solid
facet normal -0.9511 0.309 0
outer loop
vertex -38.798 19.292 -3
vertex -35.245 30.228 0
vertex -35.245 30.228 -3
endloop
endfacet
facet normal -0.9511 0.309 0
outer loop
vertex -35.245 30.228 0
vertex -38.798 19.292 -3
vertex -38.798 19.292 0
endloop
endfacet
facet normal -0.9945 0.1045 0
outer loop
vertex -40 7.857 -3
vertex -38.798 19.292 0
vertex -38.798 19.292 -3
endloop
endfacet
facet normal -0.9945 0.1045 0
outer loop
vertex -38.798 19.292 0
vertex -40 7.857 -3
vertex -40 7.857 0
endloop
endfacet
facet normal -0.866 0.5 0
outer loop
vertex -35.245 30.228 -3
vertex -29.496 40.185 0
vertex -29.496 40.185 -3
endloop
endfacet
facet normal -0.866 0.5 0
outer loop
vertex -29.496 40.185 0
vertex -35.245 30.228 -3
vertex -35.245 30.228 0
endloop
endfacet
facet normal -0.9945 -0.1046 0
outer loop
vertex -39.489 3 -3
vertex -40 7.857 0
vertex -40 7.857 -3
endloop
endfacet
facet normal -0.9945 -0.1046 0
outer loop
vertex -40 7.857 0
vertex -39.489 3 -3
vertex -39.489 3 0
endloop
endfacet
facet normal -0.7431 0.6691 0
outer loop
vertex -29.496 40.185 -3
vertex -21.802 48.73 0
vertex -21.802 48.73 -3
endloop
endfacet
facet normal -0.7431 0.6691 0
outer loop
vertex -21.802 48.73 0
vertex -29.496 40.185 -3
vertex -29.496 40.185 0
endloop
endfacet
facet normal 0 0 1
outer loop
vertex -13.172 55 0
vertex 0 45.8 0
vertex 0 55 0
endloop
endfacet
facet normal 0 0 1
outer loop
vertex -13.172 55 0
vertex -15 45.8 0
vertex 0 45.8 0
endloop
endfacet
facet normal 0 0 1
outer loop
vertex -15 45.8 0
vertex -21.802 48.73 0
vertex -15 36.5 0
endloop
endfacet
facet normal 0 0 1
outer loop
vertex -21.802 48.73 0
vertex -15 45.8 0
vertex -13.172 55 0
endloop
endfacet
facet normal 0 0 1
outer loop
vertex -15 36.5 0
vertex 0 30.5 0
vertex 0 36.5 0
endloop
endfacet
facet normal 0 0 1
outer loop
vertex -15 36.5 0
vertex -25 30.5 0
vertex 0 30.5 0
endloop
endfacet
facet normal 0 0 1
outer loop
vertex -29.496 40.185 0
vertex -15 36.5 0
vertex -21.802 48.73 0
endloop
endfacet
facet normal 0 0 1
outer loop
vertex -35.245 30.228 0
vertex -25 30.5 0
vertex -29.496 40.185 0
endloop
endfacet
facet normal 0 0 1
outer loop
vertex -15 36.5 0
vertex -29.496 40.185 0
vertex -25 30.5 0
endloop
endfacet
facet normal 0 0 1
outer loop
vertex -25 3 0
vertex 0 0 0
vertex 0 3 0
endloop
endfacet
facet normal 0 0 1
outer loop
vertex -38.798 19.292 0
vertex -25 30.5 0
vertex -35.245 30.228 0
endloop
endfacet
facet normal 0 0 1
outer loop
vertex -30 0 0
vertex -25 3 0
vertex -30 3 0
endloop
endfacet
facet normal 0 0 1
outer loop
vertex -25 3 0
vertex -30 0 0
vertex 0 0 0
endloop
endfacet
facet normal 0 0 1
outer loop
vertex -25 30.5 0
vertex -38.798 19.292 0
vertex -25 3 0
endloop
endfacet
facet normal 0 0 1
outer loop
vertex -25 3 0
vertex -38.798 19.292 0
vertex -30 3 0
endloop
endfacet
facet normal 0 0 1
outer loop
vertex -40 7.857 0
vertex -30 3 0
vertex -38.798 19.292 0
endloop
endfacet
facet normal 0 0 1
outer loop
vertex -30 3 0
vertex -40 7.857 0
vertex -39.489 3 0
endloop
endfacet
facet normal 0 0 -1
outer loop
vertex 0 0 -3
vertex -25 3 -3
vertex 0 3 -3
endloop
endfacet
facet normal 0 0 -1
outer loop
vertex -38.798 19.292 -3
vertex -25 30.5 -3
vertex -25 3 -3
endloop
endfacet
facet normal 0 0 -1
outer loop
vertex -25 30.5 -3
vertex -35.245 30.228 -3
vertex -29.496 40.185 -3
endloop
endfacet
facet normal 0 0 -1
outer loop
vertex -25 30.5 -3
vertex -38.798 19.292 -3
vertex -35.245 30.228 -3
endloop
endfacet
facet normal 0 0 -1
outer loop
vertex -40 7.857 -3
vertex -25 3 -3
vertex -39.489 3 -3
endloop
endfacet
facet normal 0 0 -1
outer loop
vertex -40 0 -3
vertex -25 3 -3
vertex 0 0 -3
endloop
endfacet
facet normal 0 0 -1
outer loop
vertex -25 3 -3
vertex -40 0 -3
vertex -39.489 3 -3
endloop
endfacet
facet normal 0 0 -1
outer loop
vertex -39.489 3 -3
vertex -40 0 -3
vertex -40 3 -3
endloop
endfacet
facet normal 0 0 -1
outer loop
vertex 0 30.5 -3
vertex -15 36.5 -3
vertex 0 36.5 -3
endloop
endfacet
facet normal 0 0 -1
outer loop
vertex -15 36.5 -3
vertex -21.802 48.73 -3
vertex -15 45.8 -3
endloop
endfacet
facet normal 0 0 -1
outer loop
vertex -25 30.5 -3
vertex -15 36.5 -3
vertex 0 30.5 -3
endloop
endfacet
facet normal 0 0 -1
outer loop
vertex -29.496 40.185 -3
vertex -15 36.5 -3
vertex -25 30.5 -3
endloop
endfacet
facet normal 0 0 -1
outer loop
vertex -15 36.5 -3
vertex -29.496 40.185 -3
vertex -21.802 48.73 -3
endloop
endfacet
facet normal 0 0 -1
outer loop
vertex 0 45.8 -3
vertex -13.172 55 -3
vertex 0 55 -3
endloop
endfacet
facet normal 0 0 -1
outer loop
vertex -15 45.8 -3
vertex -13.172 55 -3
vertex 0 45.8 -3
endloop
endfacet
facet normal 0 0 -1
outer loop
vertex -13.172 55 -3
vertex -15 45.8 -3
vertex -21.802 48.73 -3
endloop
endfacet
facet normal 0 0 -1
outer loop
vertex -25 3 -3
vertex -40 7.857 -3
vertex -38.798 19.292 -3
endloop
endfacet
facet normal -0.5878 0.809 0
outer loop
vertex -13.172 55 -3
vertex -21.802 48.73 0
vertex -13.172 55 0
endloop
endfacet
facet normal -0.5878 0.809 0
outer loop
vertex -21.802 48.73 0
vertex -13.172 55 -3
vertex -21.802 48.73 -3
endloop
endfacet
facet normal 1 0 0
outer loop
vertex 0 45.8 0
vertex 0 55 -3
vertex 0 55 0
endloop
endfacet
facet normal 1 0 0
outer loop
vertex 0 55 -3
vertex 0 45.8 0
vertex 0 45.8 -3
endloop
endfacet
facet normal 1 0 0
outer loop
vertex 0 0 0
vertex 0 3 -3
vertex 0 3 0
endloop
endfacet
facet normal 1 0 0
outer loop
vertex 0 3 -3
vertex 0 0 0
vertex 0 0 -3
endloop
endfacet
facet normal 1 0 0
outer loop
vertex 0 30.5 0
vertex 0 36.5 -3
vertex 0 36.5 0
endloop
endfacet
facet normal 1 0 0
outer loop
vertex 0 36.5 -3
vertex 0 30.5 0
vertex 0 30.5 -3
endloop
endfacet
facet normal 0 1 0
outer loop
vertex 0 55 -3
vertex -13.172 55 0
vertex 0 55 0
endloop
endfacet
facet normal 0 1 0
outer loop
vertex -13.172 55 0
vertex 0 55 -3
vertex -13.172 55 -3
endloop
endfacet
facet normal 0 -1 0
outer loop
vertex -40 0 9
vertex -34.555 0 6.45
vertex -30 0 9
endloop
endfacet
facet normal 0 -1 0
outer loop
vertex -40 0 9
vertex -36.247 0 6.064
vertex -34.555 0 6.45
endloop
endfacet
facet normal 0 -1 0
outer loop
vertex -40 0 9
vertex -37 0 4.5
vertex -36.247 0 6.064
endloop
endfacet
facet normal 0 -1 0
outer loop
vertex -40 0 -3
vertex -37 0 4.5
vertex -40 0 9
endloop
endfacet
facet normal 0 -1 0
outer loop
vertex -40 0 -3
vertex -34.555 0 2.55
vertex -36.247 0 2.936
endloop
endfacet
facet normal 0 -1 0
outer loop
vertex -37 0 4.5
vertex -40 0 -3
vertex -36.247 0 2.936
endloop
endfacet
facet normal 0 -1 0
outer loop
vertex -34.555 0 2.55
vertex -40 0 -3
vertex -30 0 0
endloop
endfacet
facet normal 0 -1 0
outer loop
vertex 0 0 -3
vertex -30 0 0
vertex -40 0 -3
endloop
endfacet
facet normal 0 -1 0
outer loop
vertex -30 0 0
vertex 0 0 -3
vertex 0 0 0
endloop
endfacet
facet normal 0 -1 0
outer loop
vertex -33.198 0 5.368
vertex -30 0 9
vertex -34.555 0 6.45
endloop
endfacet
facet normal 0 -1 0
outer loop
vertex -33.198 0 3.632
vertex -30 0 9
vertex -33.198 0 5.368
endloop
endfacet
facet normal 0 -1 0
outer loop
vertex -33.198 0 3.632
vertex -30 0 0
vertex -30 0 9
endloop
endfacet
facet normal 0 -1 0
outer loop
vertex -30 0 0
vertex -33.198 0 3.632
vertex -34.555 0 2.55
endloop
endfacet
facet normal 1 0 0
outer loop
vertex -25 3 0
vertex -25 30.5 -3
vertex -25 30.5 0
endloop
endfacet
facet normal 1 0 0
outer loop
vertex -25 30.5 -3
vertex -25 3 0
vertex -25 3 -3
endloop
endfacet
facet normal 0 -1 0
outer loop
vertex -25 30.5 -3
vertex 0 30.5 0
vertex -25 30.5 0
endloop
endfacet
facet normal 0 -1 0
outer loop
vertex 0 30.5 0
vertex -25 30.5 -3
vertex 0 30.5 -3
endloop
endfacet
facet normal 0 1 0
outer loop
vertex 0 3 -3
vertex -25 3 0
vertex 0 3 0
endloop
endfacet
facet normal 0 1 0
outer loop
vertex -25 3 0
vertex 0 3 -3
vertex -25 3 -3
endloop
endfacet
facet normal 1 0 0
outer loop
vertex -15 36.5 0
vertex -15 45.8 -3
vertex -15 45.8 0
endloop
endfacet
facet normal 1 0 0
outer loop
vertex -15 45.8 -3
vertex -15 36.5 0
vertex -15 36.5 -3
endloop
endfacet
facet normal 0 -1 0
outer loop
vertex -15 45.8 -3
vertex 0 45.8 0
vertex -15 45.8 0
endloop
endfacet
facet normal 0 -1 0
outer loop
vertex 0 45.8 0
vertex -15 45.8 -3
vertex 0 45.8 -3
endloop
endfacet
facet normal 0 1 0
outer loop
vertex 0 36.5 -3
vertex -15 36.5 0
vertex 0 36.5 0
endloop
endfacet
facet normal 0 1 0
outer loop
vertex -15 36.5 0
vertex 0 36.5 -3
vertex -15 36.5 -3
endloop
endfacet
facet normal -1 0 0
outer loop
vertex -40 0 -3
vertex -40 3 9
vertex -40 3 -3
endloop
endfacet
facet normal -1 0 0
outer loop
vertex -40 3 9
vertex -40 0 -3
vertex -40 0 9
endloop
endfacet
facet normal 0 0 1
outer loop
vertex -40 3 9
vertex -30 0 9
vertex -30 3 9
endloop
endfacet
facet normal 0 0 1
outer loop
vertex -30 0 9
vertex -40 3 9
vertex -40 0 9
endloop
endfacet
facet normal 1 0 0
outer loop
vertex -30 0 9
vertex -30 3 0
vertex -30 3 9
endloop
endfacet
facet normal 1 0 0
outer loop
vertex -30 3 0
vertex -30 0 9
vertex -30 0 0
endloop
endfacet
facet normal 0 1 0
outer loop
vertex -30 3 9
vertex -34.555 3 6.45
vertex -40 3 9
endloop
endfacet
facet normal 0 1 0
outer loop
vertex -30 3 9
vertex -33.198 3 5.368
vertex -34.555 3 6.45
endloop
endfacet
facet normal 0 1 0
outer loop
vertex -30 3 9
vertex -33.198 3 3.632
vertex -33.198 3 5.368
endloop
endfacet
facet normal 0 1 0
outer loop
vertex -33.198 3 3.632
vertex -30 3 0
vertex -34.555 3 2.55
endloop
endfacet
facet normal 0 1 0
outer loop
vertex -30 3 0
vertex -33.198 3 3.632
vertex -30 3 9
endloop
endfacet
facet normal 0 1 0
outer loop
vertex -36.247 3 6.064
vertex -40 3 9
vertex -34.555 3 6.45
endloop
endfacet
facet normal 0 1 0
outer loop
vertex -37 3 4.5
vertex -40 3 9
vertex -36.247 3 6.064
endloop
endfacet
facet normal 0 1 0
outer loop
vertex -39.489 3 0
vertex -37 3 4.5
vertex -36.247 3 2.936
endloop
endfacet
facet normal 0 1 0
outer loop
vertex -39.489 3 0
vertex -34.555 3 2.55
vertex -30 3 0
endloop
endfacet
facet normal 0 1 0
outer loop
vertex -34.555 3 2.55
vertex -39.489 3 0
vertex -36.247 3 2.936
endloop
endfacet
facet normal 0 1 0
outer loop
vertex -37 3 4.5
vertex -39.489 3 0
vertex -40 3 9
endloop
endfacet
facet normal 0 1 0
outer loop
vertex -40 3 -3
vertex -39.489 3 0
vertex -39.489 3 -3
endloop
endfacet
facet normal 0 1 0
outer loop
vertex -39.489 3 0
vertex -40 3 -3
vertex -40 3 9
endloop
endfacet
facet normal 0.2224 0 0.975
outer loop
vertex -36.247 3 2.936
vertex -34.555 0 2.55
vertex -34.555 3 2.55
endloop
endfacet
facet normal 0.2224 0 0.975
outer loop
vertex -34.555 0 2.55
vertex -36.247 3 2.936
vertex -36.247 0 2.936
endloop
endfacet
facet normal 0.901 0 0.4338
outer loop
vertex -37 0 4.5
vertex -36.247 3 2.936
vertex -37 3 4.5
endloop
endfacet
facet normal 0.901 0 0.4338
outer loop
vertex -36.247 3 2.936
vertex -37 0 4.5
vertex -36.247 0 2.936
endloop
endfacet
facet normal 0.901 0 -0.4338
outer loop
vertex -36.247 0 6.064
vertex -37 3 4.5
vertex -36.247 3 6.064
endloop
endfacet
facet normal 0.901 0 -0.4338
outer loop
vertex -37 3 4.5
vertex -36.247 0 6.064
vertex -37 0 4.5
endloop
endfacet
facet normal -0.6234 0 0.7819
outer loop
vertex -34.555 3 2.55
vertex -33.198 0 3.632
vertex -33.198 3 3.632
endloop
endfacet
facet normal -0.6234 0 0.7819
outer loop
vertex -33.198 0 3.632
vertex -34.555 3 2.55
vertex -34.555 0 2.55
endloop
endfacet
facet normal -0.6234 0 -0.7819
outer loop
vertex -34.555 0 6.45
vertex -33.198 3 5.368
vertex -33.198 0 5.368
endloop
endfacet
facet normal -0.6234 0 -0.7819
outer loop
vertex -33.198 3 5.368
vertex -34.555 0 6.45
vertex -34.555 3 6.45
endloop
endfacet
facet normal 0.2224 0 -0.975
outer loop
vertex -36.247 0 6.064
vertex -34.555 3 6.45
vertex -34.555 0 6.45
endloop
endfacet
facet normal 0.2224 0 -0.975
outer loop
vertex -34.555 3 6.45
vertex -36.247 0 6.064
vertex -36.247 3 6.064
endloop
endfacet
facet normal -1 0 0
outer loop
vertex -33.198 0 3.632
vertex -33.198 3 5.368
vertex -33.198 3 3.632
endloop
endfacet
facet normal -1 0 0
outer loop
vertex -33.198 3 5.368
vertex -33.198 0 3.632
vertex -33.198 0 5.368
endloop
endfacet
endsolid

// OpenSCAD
// file: fin.scad
module fin (batteryBoxThickness, breadBoardThickness, flip) {
	thickness = 3;
	finheight = 55;
	finDepth = 40;

	componentSpacing = 6;

	holeDiameter = 4;
	clipWidth = 10;
	clipHeight = 12;


    echo (flip);
	if (flip > 0) {
		drawFin(180, (clipHeight - thickness) * -1, thickness);
    } else {
		drawFin(0, 0, 0);
	}

	module drawFin(flipValue, clipOffset, holeOffset) {
	rotate([0,flipValue,0])
	union() {
		difference() {
			intersection() { 
				translate([finDepth - finheight, finheight/7, thickness/2])
					cylinder(h=thickness, r=finheight, center=true);
				#cube([finDepth, finheight, thickness]);
			}

			translate([-15, thickness, thickness/-2])
			#cube([finDepth, batteryBoxThickness, thickness*2]);

			translate([-25, thickness + batteryBoxThickness + componentSpacing, thickness/-2])
				#cube([finDepth, breadBoardThickness, thickness*2]);
		}


		translate([finDepth - clipWidth,0, clipOffset])
		difference() {
			cube([clipWidth, thickness, clipHeight]);
			rotate([90,0,0])
				translate([clipWidth/2, clipHeight/2 + thickness/2 - holeOffset, thickness*-.5])
					#cylinder(h=thickness*2, r = holeDiameter/2, center=true);

		}	
	}
}

}
// main file
include <fin.scad>

//fin(batteryBoxThickness=19.11, breadBoardThickness=9.3, flip=1);
fin(batteryBoxThickness=27.5, breadBoardThickness=9.3, flip=1);
